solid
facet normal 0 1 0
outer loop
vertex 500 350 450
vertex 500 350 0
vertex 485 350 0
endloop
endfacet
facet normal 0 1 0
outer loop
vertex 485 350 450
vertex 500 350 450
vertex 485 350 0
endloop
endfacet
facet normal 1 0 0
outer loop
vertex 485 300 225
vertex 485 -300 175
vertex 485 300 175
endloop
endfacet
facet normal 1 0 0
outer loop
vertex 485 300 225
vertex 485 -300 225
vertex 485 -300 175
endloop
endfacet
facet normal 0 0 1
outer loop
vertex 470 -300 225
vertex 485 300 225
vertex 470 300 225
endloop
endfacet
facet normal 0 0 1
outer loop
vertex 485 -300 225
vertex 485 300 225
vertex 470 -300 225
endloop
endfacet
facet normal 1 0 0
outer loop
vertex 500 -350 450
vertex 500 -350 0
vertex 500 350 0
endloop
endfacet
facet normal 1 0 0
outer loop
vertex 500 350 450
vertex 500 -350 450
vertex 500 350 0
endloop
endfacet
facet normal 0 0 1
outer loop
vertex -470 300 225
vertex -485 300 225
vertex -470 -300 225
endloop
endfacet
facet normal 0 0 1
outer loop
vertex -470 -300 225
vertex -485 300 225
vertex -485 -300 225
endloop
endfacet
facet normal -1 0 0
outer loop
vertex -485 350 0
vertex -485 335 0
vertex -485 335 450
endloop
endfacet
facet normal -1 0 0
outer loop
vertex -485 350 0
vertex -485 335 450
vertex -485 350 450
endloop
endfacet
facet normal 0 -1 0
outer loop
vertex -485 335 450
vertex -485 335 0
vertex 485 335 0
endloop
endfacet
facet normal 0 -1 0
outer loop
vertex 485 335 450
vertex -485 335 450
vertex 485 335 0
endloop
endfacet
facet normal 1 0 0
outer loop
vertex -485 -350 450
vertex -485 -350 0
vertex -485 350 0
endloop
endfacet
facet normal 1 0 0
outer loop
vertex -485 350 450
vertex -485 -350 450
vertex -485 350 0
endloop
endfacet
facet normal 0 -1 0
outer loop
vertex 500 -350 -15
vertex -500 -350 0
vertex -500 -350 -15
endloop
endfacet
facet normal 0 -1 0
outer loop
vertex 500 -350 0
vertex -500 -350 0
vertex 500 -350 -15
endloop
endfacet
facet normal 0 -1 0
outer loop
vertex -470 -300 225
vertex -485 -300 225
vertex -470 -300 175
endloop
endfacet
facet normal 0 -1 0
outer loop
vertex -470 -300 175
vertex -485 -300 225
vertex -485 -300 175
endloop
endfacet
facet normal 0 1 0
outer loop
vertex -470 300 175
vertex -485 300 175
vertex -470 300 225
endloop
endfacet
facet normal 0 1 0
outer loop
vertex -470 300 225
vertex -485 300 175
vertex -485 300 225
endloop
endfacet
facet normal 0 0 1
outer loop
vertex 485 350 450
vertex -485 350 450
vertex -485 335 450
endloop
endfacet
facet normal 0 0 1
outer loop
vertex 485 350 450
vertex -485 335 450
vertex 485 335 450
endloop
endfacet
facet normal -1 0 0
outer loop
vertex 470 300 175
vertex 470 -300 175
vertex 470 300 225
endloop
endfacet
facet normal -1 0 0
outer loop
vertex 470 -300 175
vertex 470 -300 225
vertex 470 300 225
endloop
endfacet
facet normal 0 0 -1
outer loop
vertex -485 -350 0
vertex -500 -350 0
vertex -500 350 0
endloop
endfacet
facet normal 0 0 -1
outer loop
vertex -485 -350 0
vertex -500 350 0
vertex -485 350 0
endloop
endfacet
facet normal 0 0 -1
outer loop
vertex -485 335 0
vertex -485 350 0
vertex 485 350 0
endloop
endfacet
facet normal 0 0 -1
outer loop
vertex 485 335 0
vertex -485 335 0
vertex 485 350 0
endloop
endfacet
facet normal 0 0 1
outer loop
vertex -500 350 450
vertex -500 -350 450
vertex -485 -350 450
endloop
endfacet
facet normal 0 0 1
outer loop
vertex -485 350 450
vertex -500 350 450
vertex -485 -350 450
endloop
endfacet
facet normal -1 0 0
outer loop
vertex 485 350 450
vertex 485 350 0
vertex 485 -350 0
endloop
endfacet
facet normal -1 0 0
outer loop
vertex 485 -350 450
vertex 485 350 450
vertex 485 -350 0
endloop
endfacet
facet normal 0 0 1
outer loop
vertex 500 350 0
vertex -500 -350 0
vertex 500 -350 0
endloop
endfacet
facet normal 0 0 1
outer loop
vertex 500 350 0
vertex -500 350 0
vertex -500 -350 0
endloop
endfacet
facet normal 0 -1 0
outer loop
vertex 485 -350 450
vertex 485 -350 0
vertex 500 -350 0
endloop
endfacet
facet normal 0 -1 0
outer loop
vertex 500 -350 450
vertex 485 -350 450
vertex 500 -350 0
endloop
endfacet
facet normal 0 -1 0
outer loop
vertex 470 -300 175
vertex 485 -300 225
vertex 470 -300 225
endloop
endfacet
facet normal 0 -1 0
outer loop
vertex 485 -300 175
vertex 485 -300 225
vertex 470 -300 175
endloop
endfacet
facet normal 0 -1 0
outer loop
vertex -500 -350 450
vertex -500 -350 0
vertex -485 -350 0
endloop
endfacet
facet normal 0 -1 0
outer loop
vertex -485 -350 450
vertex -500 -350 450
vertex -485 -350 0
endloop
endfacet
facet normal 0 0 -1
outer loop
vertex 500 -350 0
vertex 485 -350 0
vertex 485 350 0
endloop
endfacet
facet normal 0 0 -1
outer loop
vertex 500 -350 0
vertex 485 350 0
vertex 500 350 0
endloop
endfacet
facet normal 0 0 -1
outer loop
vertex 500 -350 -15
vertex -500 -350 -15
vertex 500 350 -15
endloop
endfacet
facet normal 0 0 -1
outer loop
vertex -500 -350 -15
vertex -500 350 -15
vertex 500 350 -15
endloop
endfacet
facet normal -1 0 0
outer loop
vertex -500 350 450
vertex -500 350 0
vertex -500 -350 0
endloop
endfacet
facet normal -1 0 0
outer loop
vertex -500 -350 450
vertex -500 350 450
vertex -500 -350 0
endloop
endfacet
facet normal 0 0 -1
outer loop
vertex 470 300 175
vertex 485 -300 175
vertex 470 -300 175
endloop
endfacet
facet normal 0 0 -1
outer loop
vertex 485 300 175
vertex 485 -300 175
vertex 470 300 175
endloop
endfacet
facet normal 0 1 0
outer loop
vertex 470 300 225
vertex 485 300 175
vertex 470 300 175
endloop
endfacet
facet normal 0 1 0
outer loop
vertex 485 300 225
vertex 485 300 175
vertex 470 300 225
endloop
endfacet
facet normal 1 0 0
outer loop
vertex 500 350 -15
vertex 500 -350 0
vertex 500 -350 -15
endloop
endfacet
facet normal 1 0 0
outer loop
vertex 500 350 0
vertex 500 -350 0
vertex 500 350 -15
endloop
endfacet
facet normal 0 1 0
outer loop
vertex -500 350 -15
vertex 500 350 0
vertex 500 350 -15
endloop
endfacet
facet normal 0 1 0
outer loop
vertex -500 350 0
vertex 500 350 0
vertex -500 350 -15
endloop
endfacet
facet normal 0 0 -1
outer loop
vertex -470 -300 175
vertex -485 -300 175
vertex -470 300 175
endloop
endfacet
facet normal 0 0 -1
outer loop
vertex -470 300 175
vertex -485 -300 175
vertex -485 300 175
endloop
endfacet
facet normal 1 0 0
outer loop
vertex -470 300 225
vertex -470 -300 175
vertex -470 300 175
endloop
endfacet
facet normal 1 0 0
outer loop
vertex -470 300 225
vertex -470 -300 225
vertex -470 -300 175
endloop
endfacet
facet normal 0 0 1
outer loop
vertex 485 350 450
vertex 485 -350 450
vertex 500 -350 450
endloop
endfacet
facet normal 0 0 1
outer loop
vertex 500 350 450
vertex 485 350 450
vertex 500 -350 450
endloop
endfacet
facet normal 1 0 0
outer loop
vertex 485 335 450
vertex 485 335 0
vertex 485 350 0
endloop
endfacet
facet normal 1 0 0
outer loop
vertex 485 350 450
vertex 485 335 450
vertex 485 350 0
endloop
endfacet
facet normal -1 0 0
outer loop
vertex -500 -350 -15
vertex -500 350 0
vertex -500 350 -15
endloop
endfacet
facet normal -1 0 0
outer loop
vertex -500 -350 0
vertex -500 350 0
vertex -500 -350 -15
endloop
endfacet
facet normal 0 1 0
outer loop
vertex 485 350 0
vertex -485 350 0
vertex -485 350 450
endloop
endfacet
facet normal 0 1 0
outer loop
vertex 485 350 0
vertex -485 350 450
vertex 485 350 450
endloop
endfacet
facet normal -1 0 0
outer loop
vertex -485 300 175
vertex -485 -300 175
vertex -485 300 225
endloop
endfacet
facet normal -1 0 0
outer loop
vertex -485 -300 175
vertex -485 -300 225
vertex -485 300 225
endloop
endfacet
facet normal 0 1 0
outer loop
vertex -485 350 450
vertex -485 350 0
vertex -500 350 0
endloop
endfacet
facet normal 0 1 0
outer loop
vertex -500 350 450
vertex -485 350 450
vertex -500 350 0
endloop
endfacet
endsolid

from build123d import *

# Parameters (mm, degrees)
F1_DEPTH = 450
F0_W     = 970
F0_H     = 15
F2_DEPTH = 450
F3_DEPTH = 450
F0_H_2   = 685
F4_DEPTH = 15
F5_DEPTH = 450
F7_DEPTH = 15
F9_DEPTH = 450


# Not quite as in the source:
# - a feature names something its author has since deleted; it is built from what else it names


with BuildPart() as f1:
    # F0 (on Top) → F1 (new body)
    with BuildSketch(Plane.XY):
        Polygon((-500, -350), (-485, -350), (-485, 335), (-485, 350), (-500, 350), align=None)
    extrude(amount=F1_DEPTH)


with BuildPart() as f2:
    # F0 (on Top) → F2 (new body)
    with BuildSketch(Plane.XY):
        with Locations((0, 342.5)):
            Rectangle(F0_W, F0_H)
    extrude(amount=F2_DEPTH)


with BuildPart() as f3:
    # F0 (on Top) → F3 (new body)
    with BuildSketch(Plane.XY):
        Polygon((485, -350), (500, -350), (500, 350), (485, 350), (485, 335), align=None)
    extrude(amount=F3_DEPTH)


with BuildPart() as f4:
    # F0 (on Top) → F4 (new body)
    with BuildSketch(Plane.XY):
        Polygon((-500, -350), (-485, -350), (-485, 335), (-485, 350), (-500, 350), align=None)
        with Locations((0, -7.5)):
            Rectangle(F0_W, F0_H_2)
        with Locations((0, 342.5)):
            Rectangle(F0_W, F0_H)
        Polygon((485, -350), (500, -350), (500, 350), (485, 350), (485, 335), align=None)
    extrude(amount=-F4_DEPTH)


with BuildPart() as f5:
    # F0 (on Top) → F5 (new body)
    with BuildSketch(Plane.XY):
        with Locations((0, 342.5)):
            Rectangle(F0_W, F0_H)
    extrude(amount=F5_DEPTH)


with BuildPart() as f7:
    # F6 (on face) → F7 (new body)
    with BuildSketch(Plane.YZ.offset(-485)):
        Polygon((-300, 175), (0, 175), (300, 175), (300, 225), (-300, 225), align=None)
    extrude(amount=F7_DEPTH)


with BuildPart() as f8_1:
    # F8: instance of F7
    add(f7.part.mirror(Plane.YZ))


with BuildPart() as f9:
    # F0 (on Top) → F9 (new body)
    with BuildSketch(Plane.XY):
        Polygon((-500, -350), (-485, -350), (-485, 335), (-485, 350), (-500, 350), align=None)
    extrude(amount=F9_DEPTH)


solid = Compound([f3.part, f4.part, f5.part, f7.part, f8_1.part, f9.part])
